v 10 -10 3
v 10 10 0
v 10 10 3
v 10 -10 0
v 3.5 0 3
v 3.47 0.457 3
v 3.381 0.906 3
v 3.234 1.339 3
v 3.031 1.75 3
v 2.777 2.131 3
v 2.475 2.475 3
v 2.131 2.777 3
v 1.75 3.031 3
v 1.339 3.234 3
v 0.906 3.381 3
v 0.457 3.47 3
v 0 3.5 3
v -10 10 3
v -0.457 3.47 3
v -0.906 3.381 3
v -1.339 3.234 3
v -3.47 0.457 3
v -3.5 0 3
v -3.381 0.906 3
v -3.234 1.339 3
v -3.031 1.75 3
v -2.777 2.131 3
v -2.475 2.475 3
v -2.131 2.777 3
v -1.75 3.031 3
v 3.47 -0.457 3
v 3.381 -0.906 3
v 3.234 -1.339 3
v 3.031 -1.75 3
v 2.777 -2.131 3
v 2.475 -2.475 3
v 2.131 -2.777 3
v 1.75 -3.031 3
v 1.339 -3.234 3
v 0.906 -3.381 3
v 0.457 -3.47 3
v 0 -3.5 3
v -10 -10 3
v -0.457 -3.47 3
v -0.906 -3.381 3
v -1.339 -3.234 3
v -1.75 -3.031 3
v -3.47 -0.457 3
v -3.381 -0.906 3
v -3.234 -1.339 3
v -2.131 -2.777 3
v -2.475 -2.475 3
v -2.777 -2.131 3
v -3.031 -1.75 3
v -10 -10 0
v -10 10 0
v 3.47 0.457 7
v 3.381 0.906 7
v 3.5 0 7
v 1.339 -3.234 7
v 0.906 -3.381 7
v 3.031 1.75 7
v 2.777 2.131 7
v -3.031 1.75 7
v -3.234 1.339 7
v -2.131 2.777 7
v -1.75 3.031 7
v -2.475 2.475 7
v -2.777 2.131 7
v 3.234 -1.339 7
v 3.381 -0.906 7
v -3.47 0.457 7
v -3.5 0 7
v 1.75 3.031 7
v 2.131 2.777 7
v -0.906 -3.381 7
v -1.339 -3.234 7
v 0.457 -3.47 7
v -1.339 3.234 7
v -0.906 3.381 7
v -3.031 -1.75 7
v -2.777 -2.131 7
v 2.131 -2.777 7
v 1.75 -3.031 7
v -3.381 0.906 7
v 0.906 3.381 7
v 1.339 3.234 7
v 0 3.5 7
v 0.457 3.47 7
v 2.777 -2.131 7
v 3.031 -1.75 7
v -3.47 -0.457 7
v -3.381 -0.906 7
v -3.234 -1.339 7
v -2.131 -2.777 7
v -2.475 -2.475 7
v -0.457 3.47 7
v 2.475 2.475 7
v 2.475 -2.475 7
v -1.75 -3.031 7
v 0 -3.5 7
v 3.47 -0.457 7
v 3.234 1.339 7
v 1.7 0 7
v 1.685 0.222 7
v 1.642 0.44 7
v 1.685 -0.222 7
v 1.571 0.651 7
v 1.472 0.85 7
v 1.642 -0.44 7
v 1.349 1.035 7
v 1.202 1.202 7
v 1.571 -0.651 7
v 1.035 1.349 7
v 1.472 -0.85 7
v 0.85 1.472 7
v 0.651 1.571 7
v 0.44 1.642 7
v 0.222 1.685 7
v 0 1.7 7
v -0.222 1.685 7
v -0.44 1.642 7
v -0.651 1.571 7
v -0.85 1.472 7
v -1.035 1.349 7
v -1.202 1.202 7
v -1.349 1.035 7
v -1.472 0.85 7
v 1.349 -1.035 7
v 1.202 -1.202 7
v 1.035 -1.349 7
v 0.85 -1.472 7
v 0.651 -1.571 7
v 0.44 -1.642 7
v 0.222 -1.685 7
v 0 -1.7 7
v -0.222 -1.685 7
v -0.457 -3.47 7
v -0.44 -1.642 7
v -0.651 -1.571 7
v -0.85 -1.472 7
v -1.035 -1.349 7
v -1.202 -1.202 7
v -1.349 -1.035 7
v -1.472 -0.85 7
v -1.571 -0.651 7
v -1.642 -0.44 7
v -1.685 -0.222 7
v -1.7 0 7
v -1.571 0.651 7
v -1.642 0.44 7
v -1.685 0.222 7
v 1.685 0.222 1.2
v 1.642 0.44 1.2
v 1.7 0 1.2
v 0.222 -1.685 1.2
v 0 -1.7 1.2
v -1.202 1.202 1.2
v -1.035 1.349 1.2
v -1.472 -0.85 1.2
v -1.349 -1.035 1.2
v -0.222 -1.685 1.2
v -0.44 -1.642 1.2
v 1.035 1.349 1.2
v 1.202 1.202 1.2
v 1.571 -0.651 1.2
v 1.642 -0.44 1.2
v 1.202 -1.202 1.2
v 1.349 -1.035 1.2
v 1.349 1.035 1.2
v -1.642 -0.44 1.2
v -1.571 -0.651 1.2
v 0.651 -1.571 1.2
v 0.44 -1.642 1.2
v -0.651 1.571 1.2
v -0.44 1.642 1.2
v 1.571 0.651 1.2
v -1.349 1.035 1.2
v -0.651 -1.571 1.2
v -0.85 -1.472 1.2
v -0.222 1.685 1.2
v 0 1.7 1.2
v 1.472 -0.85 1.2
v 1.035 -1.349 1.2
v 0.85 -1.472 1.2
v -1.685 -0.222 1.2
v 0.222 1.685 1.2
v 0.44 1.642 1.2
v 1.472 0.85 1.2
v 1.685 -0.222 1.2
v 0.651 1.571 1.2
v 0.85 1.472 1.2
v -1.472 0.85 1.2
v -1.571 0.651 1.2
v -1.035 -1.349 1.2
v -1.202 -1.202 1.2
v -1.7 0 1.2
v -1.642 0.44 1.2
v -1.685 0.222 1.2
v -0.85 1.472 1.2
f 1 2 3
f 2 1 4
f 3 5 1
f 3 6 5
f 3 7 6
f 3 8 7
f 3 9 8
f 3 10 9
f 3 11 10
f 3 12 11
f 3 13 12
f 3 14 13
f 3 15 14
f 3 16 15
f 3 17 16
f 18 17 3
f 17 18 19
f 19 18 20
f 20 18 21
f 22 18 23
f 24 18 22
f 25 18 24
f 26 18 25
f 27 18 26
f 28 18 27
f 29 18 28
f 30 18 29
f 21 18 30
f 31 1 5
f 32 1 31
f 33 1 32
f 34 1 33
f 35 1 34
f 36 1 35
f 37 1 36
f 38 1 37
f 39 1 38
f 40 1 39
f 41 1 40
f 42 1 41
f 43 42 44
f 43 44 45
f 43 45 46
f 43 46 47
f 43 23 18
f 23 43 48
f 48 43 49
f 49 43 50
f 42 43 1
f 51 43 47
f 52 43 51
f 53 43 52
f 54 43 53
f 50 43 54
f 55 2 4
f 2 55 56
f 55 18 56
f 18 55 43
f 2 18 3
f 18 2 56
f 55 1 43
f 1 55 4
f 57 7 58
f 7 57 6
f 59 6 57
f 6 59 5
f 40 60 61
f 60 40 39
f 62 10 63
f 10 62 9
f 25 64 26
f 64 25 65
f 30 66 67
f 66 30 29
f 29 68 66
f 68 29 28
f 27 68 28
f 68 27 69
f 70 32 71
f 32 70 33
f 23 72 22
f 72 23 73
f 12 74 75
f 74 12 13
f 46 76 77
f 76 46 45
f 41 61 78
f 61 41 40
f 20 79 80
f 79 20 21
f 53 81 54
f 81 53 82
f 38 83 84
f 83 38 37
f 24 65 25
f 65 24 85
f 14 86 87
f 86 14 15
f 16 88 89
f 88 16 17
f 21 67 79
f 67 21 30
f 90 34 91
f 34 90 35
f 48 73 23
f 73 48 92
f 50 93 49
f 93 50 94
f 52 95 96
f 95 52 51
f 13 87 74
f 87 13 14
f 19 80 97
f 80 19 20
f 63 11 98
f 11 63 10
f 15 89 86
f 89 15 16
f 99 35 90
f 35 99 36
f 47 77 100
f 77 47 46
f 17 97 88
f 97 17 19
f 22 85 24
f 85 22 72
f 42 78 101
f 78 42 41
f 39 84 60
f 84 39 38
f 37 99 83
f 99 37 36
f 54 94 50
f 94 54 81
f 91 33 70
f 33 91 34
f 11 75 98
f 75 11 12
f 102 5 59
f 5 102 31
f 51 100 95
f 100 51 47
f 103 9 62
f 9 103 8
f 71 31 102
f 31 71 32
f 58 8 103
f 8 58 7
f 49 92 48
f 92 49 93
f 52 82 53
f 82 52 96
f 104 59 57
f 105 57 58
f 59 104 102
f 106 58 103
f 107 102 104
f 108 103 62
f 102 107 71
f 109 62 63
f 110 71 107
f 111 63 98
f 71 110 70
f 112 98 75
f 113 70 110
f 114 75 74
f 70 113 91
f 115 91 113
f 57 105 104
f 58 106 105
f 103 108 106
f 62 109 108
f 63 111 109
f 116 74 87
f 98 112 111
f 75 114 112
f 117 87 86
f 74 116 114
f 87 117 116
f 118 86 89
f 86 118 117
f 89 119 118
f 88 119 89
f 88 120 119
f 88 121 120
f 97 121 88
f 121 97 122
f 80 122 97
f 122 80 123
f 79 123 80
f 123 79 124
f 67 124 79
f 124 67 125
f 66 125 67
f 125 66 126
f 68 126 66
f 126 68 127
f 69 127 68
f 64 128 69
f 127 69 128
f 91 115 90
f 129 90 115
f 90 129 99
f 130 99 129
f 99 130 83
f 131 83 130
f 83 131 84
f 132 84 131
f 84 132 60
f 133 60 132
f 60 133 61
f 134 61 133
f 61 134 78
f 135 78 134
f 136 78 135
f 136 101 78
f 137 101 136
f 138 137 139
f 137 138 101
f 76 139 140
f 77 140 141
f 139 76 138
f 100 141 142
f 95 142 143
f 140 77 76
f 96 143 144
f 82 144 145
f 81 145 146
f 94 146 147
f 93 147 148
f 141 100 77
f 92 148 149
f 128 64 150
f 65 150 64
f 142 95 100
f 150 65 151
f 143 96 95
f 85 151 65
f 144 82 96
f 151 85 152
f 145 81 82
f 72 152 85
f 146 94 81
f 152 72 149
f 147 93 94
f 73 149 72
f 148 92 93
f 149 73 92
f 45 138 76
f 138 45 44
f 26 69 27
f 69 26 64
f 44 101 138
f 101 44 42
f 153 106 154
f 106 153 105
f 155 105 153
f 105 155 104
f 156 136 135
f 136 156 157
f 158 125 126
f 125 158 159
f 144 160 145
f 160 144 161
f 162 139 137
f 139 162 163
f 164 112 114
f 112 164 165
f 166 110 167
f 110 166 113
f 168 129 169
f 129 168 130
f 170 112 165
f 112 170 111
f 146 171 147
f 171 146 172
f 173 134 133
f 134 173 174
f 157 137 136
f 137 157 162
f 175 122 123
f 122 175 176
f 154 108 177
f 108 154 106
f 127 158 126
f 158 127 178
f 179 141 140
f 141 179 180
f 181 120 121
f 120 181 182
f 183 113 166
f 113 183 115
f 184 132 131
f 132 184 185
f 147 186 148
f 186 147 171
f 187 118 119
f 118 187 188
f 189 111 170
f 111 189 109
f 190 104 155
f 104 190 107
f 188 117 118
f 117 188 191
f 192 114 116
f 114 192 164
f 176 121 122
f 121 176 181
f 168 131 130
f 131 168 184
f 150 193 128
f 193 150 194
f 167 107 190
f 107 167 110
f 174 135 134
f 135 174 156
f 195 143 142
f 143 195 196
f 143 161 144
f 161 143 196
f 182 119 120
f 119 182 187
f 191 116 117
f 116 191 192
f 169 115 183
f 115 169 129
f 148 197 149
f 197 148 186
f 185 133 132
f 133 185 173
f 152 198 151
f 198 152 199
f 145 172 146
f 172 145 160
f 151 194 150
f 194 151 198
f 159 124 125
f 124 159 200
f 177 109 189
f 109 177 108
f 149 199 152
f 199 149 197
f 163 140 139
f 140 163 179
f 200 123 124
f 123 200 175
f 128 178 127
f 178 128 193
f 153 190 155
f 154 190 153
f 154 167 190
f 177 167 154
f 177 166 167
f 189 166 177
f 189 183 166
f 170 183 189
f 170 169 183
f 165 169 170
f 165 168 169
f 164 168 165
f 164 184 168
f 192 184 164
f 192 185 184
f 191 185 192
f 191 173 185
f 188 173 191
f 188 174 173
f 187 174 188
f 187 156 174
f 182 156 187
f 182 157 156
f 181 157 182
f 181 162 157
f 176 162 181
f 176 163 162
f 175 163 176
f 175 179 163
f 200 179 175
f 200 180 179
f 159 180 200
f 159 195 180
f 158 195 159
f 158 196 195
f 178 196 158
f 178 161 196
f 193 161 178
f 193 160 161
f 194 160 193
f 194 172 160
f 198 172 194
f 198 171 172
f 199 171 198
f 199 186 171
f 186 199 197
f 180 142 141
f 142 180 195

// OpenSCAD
// Issue #166 - exact current accessory-boss test coupon.
//
// Print this small coupon before committing to heat-set inserts in the real
// enclosure. It reproduces one current backplane boss:
//   7 mm OD x 4 mm high
//   3.4 mm blind hole
//   3 mm rear wall with 1.2 mm unbroken outer skin
//
// The coupon is for retention experiments only; it is not an enclosure part.

$fn = 48;

wall_t = 3.0;
outer_skin = 1.2;
boss_d = 7.0;
boss_h = 4.0;
hole_d = 3.4;
hole_depth = boss_h + wall_t - outer_skin;

coupon_w = 20;
coupon_h = 20;

difference() {
    union() {
        translate([-coupon_w/2,-coupon_h/2,0])
            cube([coupon_w,coupon_h,wall_t]);
        translate([0,0,wall_t-0.2])
            cylinder(d=boss_d,h=boss_h+0.2);
    }

    translate([0,0,wall_t+boss_h-hole_depth])
        cylinder(d=hole_d,h=hole_depth+0.1);
}
